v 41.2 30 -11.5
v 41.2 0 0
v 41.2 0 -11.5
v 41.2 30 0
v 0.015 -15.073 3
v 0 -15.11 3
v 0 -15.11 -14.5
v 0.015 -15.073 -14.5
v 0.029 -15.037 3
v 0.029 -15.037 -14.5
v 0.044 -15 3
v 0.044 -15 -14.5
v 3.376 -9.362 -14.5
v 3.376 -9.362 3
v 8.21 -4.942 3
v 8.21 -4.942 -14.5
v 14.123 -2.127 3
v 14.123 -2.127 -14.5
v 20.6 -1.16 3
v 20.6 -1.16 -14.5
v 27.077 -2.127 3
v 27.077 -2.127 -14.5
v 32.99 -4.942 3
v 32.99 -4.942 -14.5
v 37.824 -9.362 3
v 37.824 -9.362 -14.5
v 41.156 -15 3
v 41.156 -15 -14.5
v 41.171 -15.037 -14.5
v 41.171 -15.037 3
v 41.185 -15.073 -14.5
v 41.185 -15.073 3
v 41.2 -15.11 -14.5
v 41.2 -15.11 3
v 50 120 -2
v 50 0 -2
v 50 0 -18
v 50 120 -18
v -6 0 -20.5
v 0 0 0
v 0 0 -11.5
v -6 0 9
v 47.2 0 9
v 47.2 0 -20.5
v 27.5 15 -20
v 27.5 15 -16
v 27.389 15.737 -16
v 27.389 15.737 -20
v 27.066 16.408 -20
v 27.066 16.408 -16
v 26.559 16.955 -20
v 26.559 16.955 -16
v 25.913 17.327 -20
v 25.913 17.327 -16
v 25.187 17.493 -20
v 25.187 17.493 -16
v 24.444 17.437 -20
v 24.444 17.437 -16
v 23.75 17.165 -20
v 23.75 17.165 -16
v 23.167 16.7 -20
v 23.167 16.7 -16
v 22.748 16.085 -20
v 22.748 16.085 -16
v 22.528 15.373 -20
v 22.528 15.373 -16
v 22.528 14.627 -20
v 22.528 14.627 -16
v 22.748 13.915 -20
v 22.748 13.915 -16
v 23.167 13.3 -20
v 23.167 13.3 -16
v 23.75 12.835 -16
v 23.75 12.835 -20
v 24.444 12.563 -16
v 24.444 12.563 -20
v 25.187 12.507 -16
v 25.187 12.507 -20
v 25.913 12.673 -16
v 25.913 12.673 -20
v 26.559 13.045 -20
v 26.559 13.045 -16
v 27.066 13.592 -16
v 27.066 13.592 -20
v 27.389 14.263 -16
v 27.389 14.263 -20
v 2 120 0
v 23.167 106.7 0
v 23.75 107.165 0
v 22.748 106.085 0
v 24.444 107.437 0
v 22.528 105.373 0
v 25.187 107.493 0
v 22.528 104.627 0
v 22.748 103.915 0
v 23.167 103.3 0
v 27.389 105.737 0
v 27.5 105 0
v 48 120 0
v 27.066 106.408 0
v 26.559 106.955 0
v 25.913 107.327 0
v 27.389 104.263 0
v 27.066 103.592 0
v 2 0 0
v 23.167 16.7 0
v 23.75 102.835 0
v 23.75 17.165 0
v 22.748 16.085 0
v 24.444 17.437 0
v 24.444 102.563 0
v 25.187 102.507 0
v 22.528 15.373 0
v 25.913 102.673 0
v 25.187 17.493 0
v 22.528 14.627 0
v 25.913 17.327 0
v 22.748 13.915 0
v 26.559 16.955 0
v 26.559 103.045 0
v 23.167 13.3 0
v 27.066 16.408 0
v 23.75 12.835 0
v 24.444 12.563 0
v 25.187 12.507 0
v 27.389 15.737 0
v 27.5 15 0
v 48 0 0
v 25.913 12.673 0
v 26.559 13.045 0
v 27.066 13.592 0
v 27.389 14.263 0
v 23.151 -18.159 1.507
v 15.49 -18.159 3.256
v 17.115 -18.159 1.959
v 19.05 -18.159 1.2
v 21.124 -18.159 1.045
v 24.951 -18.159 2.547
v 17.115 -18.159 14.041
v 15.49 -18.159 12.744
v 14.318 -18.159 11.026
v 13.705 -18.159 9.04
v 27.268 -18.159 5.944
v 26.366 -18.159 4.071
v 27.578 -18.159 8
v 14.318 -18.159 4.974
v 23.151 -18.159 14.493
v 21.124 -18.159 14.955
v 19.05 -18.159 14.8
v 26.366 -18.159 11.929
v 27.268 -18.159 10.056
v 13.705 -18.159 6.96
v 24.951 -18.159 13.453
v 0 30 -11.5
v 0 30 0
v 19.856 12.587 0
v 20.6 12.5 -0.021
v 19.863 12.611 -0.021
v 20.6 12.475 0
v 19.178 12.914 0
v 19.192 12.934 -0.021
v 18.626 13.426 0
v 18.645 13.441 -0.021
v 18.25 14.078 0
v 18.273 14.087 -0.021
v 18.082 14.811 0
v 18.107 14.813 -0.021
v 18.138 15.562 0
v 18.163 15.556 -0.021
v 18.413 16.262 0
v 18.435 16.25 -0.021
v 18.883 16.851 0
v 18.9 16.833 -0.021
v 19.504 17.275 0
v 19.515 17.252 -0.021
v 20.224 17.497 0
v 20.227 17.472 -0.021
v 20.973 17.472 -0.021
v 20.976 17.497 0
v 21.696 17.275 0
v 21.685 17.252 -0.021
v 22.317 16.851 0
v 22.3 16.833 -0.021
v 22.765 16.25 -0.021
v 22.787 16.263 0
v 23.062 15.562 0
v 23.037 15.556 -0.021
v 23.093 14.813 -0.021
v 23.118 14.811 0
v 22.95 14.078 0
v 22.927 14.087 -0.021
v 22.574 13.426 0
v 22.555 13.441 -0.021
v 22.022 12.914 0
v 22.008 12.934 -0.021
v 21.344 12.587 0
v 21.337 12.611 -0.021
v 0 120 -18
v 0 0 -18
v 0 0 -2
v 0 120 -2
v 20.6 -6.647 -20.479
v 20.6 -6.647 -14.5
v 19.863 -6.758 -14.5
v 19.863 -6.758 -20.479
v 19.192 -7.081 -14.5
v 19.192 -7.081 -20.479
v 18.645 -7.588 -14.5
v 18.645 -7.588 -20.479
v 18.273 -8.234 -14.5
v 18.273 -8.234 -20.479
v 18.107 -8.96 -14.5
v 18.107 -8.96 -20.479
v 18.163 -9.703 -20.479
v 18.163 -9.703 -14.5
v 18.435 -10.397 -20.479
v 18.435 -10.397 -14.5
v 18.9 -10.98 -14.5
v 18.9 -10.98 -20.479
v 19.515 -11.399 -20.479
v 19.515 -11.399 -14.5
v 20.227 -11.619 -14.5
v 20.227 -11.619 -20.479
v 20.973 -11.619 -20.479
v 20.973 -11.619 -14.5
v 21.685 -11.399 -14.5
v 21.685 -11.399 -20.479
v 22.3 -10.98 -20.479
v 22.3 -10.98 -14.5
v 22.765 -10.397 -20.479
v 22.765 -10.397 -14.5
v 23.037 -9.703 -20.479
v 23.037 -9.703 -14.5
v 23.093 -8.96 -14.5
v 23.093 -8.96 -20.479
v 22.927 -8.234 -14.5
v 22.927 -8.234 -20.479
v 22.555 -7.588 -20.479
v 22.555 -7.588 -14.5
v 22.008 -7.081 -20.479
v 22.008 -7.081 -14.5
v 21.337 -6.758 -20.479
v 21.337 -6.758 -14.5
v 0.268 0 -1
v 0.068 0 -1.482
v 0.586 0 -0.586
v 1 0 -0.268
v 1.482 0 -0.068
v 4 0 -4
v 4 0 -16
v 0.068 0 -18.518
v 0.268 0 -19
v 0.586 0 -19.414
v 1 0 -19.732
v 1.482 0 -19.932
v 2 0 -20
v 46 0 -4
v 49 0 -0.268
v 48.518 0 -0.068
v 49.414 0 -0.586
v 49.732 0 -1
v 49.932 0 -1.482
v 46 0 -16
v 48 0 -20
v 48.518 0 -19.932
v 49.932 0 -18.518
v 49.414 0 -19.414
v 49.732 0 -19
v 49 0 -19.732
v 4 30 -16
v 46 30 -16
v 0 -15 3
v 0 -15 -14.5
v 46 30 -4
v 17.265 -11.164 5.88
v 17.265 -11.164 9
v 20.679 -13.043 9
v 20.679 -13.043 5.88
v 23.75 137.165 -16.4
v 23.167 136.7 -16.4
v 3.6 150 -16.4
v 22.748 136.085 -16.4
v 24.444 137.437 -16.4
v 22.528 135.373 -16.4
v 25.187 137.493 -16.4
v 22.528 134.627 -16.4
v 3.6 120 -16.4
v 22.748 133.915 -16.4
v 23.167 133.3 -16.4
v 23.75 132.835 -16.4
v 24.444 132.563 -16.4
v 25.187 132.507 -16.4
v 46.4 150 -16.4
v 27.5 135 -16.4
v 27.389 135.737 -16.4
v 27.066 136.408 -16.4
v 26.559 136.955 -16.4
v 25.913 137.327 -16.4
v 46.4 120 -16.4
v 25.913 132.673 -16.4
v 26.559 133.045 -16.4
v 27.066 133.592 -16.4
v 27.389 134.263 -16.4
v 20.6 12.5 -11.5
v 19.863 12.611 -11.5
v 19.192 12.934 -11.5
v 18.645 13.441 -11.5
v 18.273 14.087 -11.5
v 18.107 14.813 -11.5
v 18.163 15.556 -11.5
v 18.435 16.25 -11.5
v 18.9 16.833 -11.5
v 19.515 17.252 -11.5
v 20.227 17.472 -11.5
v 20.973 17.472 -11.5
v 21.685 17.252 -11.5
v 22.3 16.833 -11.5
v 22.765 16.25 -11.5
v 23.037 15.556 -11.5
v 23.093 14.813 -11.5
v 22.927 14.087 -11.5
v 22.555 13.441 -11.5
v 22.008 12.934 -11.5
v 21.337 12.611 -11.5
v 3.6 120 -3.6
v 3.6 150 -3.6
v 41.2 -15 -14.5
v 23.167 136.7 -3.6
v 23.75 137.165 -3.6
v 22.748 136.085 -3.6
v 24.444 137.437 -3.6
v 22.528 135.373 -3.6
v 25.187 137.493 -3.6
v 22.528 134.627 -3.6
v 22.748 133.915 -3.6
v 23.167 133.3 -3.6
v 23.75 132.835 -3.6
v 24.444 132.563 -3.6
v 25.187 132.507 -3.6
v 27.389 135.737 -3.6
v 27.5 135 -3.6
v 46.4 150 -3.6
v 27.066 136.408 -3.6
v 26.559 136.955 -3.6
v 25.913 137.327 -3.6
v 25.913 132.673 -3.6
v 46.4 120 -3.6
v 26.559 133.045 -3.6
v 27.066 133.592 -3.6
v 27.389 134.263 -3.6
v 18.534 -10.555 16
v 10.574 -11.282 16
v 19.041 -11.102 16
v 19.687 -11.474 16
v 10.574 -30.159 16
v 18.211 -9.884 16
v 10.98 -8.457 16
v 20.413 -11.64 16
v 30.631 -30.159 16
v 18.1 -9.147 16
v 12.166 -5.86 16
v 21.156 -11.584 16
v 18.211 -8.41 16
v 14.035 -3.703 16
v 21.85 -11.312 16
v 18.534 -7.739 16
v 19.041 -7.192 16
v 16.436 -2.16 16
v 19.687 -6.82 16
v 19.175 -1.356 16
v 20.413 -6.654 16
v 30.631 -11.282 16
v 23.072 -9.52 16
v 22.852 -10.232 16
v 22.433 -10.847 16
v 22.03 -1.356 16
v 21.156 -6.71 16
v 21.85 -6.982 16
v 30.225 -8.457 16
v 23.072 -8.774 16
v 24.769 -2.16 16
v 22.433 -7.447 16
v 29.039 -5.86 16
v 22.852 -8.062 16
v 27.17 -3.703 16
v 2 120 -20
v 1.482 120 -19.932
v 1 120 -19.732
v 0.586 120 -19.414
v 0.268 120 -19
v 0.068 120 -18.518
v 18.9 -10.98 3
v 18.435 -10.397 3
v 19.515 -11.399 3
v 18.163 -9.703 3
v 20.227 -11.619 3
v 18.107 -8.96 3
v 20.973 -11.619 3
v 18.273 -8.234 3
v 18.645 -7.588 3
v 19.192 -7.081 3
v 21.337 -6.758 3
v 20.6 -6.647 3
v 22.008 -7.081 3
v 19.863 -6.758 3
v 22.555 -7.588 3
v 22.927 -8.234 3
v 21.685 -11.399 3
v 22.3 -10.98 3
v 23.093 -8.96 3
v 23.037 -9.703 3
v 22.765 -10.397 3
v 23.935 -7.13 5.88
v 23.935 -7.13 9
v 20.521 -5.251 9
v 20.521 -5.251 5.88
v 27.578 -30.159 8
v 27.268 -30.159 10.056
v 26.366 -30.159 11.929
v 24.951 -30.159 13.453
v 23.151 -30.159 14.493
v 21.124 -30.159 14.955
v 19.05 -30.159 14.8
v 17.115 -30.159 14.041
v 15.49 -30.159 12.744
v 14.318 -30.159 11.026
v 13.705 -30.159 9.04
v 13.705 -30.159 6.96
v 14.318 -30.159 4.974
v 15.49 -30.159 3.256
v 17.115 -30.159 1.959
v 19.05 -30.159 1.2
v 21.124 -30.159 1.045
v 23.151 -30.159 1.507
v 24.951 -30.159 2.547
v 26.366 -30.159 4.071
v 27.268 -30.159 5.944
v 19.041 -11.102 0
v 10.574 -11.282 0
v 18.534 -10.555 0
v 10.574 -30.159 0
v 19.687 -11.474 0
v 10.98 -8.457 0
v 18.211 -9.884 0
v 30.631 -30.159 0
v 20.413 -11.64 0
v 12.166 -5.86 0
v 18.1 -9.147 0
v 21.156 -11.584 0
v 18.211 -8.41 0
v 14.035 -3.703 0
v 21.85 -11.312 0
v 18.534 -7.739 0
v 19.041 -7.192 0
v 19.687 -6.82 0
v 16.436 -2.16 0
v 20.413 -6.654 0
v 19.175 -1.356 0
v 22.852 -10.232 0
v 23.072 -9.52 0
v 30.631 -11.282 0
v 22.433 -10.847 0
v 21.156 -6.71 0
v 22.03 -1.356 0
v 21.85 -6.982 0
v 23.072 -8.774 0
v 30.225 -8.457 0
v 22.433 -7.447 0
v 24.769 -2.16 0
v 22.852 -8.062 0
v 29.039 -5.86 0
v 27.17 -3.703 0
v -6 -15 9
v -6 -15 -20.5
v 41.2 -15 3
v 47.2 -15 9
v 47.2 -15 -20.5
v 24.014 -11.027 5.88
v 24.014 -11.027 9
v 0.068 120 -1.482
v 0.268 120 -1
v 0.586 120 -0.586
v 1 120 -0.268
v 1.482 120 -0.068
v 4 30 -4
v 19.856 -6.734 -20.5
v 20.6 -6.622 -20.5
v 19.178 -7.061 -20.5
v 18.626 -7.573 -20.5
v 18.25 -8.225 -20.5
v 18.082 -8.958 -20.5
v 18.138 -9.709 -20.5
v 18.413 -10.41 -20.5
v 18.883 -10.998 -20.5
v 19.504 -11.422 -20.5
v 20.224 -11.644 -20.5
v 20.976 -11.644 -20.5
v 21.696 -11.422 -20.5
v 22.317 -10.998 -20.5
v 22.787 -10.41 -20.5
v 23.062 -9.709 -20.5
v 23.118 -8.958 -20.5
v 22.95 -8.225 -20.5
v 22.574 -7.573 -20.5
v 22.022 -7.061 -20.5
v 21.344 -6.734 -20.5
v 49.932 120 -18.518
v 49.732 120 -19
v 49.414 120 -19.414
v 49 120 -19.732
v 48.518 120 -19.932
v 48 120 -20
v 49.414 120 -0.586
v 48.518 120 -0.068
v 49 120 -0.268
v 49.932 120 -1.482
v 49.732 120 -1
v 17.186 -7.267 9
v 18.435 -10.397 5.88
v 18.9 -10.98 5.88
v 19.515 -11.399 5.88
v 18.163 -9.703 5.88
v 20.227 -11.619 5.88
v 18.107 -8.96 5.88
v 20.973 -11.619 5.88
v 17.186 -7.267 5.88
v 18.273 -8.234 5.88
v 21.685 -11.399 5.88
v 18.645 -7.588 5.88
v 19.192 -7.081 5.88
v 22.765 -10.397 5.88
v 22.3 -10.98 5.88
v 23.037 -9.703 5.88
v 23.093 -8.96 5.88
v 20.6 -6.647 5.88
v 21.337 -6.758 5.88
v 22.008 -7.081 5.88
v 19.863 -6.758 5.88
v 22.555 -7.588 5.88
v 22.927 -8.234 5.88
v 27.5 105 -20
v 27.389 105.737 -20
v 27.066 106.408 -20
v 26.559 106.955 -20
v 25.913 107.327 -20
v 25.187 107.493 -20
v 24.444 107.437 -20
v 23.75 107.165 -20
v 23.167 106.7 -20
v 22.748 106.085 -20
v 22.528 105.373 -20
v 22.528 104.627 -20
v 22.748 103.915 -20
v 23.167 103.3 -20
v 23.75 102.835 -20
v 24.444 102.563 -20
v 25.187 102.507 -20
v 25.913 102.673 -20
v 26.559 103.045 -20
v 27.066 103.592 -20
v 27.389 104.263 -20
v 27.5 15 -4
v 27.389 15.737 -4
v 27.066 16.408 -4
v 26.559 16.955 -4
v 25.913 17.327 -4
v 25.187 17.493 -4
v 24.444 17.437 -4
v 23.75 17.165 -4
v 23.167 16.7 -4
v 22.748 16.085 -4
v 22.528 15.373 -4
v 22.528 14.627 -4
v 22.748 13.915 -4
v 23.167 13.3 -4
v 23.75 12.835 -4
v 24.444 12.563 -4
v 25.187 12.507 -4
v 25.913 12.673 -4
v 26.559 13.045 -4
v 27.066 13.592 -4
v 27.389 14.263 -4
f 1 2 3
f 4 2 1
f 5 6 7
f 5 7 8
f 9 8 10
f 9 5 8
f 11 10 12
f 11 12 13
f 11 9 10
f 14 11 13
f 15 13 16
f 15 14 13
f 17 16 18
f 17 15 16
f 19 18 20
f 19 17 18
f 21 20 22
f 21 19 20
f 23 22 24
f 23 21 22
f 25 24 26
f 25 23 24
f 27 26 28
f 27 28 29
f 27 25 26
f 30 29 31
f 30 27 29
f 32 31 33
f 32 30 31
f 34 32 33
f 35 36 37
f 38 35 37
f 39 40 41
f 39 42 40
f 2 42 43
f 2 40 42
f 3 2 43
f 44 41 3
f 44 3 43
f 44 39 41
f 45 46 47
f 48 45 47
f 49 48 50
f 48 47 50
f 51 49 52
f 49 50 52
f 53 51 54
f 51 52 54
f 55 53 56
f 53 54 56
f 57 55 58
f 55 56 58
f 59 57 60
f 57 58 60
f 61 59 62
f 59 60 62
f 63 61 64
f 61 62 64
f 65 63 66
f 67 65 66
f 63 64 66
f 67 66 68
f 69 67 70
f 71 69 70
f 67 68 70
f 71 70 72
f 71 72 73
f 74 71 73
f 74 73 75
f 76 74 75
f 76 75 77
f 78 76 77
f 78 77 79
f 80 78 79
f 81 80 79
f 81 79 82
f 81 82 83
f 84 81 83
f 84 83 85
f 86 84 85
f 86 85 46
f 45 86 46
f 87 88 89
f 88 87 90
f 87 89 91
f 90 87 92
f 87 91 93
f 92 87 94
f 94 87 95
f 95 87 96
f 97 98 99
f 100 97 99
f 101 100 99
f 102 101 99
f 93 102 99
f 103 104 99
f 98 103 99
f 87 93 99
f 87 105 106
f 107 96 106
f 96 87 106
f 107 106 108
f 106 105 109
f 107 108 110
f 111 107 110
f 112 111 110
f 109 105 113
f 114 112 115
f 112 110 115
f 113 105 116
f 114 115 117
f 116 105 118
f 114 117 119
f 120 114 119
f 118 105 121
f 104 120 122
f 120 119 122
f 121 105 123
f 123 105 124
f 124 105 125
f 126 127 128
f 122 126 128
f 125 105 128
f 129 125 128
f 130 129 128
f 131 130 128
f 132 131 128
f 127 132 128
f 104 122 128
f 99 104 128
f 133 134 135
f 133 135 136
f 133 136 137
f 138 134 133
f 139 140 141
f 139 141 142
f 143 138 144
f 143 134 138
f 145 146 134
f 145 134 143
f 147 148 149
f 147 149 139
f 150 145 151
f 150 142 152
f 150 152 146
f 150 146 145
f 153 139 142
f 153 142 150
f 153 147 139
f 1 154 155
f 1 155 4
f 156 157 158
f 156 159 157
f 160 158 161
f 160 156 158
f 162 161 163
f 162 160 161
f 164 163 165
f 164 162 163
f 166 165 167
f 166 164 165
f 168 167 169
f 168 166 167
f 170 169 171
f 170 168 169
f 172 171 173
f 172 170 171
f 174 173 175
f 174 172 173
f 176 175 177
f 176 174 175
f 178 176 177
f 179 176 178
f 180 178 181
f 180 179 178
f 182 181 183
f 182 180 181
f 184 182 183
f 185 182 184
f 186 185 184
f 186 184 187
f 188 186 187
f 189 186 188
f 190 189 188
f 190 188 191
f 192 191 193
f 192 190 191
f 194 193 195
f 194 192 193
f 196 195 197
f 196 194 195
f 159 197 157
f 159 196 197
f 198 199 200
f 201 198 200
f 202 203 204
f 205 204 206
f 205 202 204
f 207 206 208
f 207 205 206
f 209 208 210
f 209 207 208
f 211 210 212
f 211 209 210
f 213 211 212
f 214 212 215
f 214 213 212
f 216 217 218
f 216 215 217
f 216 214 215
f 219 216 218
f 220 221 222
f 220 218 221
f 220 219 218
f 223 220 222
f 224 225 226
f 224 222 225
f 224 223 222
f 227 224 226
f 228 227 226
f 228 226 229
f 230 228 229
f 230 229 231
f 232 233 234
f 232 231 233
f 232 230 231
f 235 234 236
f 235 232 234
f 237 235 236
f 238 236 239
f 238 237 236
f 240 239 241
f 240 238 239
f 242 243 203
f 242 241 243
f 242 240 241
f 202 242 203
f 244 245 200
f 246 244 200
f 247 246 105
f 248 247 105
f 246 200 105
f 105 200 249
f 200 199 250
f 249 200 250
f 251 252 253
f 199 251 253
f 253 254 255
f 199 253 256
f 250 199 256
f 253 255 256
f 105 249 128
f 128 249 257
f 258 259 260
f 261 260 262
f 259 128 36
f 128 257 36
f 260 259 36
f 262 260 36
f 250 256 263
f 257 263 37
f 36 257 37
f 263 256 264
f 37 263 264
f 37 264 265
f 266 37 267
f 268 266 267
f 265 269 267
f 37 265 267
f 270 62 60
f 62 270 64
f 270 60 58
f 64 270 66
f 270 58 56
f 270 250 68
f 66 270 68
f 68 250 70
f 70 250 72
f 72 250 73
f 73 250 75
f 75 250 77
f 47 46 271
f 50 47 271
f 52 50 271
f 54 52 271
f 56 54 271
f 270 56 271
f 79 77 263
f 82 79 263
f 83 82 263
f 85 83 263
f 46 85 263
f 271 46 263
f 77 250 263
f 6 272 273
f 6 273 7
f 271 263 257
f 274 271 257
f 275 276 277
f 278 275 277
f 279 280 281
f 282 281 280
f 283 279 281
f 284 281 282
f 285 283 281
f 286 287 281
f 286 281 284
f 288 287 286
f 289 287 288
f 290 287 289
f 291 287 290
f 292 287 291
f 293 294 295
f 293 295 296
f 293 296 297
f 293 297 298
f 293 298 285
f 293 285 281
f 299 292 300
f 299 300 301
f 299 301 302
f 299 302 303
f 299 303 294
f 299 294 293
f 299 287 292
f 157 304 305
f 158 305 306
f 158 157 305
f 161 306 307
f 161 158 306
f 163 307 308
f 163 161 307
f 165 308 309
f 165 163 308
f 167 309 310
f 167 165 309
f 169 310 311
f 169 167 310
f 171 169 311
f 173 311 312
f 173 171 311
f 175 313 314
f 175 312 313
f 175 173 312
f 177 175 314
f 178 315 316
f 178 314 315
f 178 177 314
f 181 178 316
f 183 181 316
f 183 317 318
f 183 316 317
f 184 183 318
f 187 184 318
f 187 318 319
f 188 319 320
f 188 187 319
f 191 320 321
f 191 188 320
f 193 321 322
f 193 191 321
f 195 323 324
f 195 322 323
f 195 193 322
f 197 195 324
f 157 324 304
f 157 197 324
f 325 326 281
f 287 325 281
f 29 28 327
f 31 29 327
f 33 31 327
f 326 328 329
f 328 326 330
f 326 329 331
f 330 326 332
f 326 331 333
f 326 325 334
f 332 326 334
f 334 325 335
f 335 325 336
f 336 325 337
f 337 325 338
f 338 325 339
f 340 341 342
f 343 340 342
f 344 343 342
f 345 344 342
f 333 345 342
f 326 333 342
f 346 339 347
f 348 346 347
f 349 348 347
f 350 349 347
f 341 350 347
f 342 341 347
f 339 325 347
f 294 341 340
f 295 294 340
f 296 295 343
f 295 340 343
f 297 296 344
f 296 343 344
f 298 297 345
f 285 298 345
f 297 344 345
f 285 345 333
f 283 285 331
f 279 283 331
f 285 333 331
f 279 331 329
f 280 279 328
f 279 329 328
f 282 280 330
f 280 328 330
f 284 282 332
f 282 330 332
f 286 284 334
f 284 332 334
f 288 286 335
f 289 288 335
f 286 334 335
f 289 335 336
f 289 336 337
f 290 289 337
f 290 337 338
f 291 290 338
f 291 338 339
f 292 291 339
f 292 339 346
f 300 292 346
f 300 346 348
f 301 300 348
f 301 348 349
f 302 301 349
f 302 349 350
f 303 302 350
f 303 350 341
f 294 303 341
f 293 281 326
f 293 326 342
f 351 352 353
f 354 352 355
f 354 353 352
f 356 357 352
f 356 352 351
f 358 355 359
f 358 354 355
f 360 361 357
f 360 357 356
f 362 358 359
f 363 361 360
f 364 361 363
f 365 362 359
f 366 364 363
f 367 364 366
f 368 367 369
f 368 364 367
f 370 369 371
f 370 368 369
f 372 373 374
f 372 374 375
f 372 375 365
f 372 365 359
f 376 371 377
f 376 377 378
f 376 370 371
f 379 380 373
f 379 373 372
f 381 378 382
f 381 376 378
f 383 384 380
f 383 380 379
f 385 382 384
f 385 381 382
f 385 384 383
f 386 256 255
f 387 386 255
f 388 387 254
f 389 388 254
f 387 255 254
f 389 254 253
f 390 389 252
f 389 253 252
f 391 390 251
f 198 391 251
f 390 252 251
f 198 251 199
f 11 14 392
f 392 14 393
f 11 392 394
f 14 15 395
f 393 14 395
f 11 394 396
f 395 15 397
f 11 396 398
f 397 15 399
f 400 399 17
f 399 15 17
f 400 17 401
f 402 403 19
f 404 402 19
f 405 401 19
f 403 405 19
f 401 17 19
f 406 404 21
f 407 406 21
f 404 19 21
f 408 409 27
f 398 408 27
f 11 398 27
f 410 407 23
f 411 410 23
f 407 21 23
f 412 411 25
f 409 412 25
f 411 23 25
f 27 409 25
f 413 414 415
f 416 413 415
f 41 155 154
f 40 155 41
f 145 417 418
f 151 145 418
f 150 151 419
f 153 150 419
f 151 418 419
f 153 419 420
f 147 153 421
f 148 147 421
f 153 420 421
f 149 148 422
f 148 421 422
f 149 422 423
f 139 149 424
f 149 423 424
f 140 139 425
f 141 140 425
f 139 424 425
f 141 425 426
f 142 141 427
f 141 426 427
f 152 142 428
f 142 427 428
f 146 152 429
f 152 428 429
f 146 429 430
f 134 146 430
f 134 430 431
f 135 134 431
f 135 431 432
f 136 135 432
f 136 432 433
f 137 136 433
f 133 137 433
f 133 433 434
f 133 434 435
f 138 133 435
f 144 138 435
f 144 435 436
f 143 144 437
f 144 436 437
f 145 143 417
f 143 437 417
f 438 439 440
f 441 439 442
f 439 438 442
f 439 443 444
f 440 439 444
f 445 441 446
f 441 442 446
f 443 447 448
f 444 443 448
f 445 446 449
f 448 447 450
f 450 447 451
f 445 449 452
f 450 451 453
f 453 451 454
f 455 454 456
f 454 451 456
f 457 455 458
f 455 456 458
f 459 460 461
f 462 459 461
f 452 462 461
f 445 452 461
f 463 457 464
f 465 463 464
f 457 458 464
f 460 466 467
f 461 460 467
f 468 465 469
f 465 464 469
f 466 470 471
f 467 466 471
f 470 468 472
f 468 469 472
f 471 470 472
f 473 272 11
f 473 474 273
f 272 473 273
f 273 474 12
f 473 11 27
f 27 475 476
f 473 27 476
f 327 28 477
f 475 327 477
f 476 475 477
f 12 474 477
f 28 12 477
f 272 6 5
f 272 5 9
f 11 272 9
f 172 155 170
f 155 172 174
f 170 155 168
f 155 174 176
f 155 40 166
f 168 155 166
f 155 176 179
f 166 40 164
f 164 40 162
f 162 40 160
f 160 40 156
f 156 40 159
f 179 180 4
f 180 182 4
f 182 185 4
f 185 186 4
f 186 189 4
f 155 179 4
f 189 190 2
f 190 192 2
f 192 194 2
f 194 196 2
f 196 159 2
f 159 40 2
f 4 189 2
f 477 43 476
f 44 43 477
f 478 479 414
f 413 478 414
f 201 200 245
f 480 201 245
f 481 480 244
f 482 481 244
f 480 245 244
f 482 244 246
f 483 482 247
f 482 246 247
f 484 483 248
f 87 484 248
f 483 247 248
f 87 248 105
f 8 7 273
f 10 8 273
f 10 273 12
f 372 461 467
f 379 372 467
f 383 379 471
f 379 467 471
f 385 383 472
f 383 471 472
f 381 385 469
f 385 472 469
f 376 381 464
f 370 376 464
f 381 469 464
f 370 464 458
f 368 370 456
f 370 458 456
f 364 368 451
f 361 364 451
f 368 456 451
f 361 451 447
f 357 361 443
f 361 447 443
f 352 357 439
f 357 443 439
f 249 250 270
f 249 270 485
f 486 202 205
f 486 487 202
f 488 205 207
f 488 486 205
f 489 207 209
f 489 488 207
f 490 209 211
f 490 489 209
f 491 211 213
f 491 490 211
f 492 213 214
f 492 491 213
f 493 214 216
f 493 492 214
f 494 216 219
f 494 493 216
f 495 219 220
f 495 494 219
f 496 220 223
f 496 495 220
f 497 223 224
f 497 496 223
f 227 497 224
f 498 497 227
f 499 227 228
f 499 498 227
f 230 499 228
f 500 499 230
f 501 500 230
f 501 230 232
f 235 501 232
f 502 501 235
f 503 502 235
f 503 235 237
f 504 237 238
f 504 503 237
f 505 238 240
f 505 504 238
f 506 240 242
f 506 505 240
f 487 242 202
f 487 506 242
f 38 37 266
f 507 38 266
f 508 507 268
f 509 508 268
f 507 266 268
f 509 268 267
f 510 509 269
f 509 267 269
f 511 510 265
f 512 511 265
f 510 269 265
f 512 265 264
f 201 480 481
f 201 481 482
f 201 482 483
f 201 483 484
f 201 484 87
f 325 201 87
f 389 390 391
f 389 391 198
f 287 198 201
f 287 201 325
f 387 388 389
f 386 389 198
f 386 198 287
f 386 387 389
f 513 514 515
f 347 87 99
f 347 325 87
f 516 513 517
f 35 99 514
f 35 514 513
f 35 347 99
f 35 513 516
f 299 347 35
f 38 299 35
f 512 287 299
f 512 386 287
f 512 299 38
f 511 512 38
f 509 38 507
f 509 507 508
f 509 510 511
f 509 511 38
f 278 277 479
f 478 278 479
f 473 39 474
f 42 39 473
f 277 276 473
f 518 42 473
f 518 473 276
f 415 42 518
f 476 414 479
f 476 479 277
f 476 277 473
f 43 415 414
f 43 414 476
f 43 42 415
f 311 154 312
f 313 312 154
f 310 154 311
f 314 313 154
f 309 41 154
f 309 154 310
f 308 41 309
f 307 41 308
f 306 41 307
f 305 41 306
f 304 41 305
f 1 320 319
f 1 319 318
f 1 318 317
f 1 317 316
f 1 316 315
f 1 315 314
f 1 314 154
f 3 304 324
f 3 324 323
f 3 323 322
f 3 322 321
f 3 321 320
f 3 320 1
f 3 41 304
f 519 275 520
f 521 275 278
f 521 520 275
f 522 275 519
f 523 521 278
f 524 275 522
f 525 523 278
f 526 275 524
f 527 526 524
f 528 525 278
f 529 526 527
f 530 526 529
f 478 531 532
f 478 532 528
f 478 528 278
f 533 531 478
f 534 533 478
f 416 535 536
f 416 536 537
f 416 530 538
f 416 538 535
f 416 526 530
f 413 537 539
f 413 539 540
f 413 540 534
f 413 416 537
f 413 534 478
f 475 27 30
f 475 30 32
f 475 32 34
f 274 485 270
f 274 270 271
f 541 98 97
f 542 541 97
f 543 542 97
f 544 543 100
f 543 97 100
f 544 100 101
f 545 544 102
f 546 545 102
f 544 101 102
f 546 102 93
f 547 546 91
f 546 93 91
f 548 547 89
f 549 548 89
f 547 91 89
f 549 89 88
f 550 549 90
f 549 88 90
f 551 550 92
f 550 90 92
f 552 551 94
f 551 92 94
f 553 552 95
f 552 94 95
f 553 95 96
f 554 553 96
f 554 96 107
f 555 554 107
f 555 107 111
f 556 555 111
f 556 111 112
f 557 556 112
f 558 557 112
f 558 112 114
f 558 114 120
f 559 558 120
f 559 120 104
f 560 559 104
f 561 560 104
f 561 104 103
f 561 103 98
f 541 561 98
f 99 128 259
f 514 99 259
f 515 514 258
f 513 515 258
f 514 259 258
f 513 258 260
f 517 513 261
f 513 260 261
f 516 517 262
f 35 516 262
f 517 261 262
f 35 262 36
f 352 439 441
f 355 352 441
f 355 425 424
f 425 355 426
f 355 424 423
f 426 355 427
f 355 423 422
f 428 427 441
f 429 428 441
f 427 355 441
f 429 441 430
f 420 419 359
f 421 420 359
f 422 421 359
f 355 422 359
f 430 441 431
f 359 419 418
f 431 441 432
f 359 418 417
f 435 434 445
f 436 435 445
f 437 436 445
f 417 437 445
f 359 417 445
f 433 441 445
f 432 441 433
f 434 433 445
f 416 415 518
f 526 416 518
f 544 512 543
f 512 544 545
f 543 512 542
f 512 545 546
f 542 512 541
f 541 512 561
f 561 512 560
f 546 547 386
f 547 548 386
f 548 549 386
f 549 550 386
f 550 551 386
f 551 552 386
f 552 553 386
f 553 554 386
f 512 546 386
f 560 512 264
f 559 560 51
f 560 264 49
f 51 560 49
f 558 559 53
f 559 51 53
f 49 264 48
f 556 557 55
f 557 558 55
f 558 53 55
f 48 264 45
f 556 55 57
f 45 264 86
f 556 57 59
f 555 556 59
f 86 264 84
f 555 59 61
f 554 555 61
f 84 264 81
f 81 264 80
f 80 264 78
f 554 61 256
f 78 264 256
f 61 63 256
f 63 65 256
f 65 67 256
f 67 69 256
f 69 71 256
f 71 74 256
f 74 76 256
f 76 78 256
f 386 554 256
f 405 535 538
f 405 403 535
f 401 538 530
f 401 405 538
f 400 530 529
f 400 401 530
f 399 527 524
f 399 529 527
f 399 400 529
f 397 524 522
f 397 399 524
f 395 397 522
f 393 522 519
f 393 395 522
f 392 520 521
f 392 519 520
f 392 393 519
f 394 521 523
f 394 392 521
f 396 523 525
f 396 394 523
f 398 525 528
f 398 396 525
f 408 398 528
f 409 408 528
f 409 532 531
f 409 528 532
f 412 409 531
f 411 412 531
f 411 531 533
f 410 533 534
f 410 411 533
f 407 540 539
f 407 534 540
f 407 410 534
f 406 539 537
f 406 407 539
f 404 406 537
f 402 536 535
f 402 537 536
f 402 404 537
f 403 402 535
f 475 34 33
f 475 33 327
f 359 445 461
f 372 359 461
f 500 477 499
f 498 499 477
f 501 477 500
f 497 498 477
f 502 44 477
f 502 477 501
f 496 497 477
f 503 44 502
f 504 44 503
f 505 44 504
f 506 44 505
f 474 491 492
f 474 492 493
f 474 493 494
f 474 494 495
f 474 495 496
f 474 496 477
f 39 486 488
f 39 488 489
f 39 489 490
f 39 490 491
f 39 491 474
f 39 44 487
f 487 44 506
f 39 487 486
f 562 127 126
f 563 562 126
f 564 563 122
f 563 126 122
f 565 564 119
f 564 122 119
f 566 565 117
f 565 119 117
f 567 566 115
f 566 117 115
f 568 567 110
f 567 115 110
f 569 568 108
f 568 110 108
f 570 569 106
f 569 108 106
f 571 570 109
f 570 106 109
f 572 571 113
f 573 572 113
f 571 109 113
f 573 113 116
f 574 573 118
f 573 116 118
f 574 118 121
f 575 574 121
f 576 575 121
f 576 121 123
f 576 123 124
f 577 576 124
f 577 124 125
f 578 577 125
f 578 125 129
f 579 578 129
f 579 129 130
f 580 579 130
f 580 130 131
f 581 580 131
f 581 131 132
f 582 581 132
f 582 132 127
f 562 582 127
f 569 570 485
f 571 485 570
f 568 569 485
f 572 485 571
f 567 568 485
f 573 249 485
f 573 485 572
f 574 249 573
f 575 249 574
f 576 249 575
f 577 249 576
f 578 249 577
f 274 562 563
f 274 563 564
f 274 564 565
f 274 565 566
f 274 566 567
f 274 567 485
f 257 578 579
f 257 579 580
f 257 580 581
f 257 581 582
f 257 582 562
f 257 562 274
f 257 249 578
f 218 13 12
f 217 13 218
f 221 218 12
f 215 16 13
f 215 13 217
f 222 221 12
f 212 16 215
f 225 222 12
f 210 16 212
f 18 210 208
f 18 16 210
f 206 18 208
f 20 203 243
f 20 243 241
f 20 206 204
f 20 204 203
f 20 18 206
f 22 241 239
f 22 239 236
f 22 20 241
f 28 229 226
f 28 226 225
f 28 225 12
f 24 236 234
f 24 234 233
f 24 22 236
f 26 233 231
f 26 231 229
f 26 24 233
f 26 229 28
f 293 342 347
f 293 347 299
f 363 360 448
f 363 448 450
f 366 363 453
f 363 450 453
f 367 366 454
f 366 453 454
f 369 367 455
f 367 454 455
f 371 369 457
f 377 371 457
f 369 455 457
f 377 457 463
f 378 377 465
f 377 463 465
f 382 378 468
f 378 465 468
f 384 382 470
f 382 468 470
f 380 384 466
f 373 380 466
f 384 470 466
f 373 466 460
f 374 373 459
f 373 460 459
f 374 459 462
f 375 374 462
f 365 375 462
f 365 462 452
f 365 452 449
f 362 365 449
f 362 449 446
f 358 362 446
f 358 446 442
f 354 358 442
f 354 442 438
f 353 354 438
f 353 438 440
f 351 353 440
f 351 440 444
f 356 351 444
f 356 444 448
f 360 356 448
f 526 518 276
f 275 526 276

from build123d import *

# Parameters (mm, degrees)
BOSS_EXTRUDE1_DEPTH      = 120
SKETCH3_W                = 42
SKETCH3_H                = 12
CUT_EXTRUDE2_DEPTH       = 30
SKETCH6_R                = 2.5
CUT_EXTRUDE3_DEPTH       = 30
SKETCH8_W                = 42.8
SKETCH8_H                = 12.8
BOSS_EXTRUDE2_DEPTH      = 30
SKETCH9_R                = 2.5
CUT_EXTRUDE4_DEPTH       = 30
SKETCH11_W               = 41.2
SKETCH11_H               = 11.5
BOSS_EXTRUDE3_DEPTH      = 30
BOSS_EXTRUDE4_DEPTH      = 3
BOSS_EXTRUDE4_DEPTH_BACK = 14.5
SKETCH16_W               = 41.2
SKETCH16_H               = 17.5
BOSS_EXTRUDE5_DEPTH      = 15
CUT_EXTRUDE5_DEPTH       = 3.12
BOSS_EXTRUDE6_DEPTH      = 16
SKETCH25_R               = 6.975
CUT_EXTRUDE6_DEPTH       = 12
SKETCH29_R               = 2.5
CUT_EXTRUDE8_DEPTH       = 17


with BuildPart() as part:
    # Sketch1 → Boss-Extrude1 (new body)
    with BuildSketch(Plane(origin=(0, 0, 0), x_dir=(1, 0, 0), z_dir=(0, 1, 0))):
        with BuildLine():
            Line((2, 0), (48, 0))
            ThreePointArc((48, 0), (49.414213562, 0.585786438), (50, 2))
            Line((50, 2), (50, 18))
            ThreePointArc((50, 18), (49.414213562, 19.414213562), (48, 20))
            Line((48, 20), (2, 20))
            ThreePointArc((2, 20), (0.585786438, 19.414213562), (0, 18))
            Line((0, 18), (0, 2))
            ThreePointArc((0, 2), (0.585786438, 0.585786438), (2, 0))
        make_face()
    extrude(amount=BOSS_EXTRUDE1_DEPTH)

    # Sketch3 → Cut-Extrude2 (cut)
    with BuildSketch(Plane.XZ):
        with Locations((25, -10)):
            Rectangle(SKETCH3_W, SKETCH3_H)
    extrude(amount=-CUT_EXTRUDE2_DEPTH, mode=Mode.SUBTRACT)

    # Sketch6 → Cut-Extrude3 (cut)
    with BuildSketch(Plane.XY):
        with Locations((25, 105)):
            Circle(SKETCH6_R)
        with Locations((25, 15)):
            Circle(SKETCH6_R)
    extrude(amount=-CUT_EXTRUDE3_DEPTH, mode=Mode.SUBTRACT)

    # Sketch8 → Boss-Extrude2 (add)
    with BuildSketch(Plane(origin=(0, 120, 0), x_dir=(1, 0, 0), z_dir=(0, 1, 0))):
        with Locations((25, 10)):
            Rectangle(SKETCH8_W, SKETCH8_H)
    extrude(amount=BOSS_EXTRUDE2_DEPTH)

    # Sketch9 → Cut-Extrude4 (cut)
    with BuildSketch(Plane.XY.offset(-3.6)):
        with Locations((25, 135)):
            Circle(SKETCH9_R)
    extrude(amount=-CUT_EXTRUDE4_DEPTH, mode=Mode.SUBTRACT)


with BuildPart() as body_2:
    # Sketch11 → Boss-Extrude3 (new body)
    with BuildSketch(Plane(origin=(0, 0, 0), x_dir=(1, 0, 0), z_dir=(0, 1, 0))):
        with Locations((20.6, 5.75)):
            Rectangle(SKETCH11_W, SKETCH11_H)
    extrude(amount=BOSS_EXTRUDE3_DEPTH)

    # Sketch13 → Ø5.0 (5) Diameter Hole1 (revolve, cut)
    with BuildSketch(Plane(origin=(20.6, 15, 0), x_dir=(0, -1, 0), z_dir=(1, 0, 0))):
        Polygon((0, 0), (0, 20), (2.5, 20), (2.5, 0.020977491), (2.525, 0), align=None)
    revolve(axis=Axis((20.6, 15, 6.35), (0, 0, -1)), mode=Mode.SUBTRACT)

    # Sketch15 → Boss-Extrude4 (add, two sides)
    with BuildSketch(Plane.XY) as boss_extrude4_sk:
        with BuildLine():
            Line((0, 0), (0, -15.109741722))
            ThreePointArc((0, -15.109741722), (20.6, -1.159826197), (41.2, -15.109741722))
            Line((41.2, -15.109741722), (41.2, 0))
            Line((41.2, 0), (0, 0))
        make_face()
    extrude(amount=BOSS_EXTRUDE4_DEPTH)
    extrude(boss_extrude4_sk.sketch, amount=-BOSS_EXTRUDE4_DEPTH_BACK)

    # Sketch16 → Boss-Extrude5 (add)
    with BuildSketch(Plane(origin=(0, 0, 0), x_dir=(1, 0, 0), z_dir=(0, 1, 0))):
        Polygon((-6, 20.5), (-6, 11.5), (-6, 0), (-6, -9), (47.2, -9), (47.2, 0), (47.2, 11.5), (47.2, 20.5), align=None)
        with Locations((20.6, 5.75)):
            Rectangle(SKETCH16_W, SKETCH16_H, mode=Mode.SUBTRACT)
    extrude(amount=-BOSS_EXTRUDE5_DEPTH)

    # Sketch18 → Ø5.0 (5) Diameter Hole2 (revolve, cut)
    with BuildSketch(Plane(origin=(20.6, -9.147025383, -20.5), x_dir=(0, 1, 0), z_dir=(1, 0, 0))):
        Polygon((0, 0), (0, 29.5), (2.5, 29.5), (2.5, 0.020977491), (2.525, 0), align=None)
    revolve(axis=Axis((20.6, -9.147025383, -26.85), (0, 0, 1)), mode=Mode.SUBTRACT)

    # Sketch22 → Cut-Extrude5 (cut)
    with BuildSketch(Plane.XY.offset(9)):
        Polygon((24.013806249, -11.026766561), (23.934806737, -7.130453037), (20.521000488, -5.250711859), (17.186193751, -7.267284205), (17.265193263, -11.163597729), (20.678999512, -13.043338907), align=None)
    extrude(amount=-CUT_EXTRUDE5_DEPTH, mode=Mode.SUBTRACT)


with BuildPart() as body_3:
    # Sketch24 → Boss-Extrude6 (new body)
    with BuildSketch(Plane.XY):
        with BuildLine():
            Line((10.573788764, -11.282332988), (10.573788764, -30.158964502))
            Line((10.573788764, -30.158964502), (30.631278849, -30.158964502))
            Line((30.631278849, -30.158964502), (30.631278849, -11.282332988))
            ThreePointArc((30.631278849, -11.282332988), (20.602533806, -1.253587945), (10.573788764, -11.282332988))
        make_face()
    extrude(amount=BOSS_EXTRUDE6_DEPTH)

    # Sketch25 → Cut-Extrude6 (cut)
    with BuildSketch(Plane.XZ.offset(30.158964502)):
        with Locations((20.602549742, 7.999999594)):
            Circle(SKETCH25_R)
    extrude(amount=-CUT_EXTRUDE6_DEPTH, mode=Mode.SUBTRACT)

    # Sketch29 → Cut-Extrude8 (cut, through all)
    with BuildSketch(Plane(origin=(0, 0, 0), x_dir=(-1, 0, 0), z_dir=(0, 0, -1))):
        with Locations((-20.6, -9.147025383)):
            Circle(SKETCH29_R)
    extrude(amount=-CUT_EXTRUDE8_DEPTH, mode=Mode.SUBTRACT)


solid = Compound([part.part, body_2.part, body_3.part])
